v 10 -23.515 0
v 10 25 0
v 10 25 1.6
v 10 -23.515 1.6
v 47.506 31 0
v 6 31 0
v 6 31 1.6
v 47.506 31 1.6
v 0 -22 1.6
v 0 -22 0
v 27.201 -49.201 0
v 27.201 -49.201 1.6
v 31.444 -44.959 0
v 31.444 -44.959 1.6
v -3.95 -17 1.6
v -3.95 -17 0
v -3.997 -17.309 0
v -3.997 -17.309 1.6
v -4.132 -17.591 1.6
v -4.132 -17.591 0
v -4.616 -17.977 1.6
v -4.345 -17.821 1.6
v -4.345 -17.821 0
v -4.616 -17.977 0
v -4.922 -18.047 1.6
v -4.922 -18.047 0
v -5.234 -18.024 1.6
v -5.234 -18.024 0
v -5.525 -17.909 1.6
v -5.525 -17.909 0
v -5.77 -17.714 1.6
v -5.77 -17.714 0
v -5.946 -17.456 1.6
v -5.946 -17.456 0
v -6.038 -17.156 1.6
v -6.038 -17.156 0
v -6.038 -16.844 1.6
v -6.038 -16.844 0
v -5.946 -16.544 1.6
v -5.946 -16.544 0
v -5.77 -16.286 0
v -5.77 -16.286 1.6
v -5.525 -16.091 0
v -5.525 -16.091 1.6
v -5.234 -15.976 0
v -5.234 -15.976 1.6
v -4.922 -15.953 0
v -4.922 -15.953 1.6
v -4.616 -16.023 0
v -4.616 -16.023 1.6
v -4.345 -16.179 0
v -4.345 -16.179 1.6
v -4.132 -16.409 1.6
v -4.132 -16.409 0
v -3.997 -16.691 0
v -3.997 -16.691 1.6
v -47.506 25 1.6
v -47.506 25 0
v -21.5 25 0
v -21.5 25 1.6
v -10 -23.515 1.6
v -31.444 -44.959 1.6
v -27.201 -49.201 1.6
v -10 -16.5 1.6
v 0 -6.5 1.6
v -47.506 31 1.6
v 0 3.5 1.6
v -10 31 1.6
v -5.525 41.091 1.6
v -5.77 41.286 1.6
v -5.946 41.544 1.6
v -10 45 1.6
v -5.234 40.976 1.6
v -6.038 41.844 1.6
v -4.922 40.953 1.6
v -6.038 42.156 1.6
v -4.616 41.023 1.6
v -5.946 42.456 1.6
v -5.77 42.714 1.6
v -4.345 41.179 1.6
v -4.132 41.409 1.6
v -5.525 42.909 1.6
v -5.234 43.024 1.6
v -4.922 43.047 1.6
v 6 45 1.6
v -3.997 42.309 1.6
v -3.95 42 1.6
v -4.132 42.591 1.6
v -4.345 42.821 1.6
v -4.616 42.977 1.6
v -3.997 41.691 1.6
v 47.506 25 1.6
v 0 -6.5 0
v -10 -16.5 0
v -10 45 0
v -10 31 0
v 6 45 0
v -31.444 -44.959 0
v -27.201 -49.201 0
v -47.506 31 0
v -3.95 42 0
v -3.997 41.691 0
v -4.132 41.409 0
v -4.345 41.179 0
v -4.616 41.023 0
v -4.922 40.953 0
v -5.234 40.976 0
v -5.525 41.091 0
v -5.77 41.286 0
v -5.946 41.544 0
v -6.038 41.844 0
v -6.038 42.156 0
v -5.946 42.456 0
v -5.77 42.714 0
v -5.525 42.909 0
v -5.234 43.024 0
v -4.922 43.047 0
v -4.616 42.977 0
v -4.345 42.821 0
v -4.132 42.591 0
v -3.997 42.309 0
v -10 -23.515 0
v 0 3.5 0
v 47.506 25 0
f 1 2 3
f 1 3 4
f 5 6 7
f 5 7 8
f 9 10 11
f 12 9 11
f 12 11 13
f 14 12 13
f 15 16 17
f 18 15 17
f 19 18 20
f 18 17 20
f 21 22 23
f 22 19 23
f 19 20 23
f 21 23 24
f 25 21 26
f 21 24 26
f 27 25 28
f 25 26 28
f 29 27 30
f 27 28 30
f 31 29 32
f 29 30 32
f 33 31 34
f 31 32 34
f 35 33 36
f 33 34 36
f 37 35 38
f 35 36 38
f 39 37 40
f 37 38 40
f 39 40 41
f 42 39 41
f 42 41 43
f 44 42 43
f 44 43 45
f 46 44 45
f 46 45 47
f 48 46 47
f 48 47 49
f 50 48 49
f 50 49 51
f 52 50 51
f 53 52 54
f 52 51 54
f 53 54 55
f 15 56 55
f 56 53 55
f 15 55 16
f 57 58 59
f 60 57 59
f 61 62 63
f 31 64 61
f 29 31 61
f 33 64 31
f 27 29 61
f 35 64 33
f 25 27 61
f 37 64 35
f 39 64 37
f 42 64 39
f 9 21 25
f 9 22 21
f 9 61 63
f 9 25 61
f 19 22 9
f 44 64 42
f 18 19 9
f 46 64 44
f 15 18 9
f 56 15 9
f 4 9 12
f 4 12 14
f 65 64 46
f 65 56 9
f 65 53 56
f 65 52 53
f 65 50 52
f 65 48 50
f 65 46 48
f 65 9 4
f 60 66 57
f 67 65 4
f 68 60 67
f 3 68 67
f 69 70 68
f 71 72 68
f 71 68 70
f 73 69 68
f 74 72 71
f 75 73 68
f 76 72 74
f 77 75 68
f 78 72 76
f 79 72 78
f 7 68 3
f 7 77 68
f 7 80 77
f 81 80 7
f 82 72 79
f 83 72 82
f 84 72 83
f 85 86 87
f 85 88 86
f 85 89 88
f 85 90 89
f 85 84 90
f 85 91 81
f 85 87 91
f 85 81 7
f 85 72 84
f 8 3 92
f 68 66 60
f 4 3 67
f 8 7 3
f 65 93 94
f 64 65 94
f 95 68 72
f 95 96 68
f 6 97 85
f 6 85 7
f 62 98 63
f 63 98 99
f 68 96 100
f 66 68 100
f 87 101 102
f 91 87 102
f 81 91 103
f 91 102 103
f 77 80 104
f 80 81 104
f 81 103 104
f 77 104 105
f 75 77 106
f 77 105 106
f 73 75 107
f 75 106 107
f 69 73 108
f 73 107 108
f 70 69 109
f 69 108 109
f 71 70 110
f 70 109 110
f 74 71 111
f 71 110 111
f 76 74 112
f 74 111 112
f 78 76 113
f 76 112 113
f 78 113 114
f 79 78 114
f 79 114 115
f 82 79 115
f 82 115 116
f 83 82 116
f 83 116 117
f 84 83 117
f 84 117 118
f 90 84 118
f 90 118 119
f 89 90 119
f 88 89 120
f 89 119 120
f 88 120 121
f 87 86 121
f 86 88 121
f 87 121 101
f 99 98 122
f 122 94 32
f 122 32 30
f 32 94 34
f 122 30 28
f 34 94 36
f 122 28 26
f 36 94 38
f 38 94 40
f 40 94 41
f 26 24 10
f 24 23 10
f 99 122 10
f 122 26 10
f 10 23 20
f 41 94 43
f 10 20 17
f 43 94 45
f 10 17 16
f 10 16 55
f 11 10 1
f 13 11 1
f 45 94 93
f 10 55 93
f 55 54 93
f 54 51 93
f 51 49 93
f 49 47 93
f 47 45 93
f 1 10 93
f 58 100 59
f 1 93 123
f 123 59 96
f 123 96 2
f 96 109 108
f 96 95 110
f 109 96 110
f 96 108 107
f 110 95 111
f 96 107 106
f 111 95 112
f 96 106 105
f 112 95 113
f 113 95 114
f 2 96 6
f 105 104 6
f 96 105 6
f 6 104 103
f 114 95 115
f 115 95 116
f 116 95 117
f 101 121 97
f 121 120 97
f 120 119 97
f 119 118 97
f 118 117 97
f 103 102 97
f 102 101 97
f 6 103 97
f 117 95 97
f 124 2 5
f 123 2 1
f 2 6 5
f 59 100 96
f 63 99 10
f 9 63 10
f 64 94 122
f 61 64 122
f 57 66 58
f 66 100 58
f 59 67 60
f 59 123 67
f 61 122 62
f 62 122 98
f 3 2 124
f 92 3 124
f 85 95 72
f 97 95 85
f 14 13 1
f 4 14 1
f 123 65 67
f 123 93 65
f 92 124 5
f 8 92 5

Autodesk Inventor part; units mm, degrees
ref_plane "YZ Plane" through (0, 0, 0) normal (1, 0, 0) x (0, 1, 0)
ref_plane "XZ Plane" through (0, 0, 0) normal (0, 1, 0) x (-1, 0, 0)
ref_plane "XY Plane" through (0, 0, 0) normal (0, 0, 1) x (1, 0, 0)
sketch "Skizze1" plane through (0, 0, 0) normal (0, 0, 1) x (1, 0, 0)
  circle A0 centre (-57.772, 35) radius 20 construction
  circle A1 centre (57.772, 35) radius 20 construction
  circle A2 centre (35, -57.772) radius 20 construction
  circle A3 centre (-35, -57.772) radius 20 construction
  line L0 (0, 81.5544) -> (0, -104.3264) construction
  line L1 (-108.8808, 0) -> (108.8808, 0) construction
  circle A4 centre (0, 0) radius 25 construction
  line L2 (10, 25) -> (10, -23.5147)
  circle A5 centre (-6, -2.5) radius 6 construction
  line L3 (0, 3.5) -> (-21.5, 25)
  line L4 (0, -6.5) -> (-10, -16.5)
  line L5 (-10, -16.5) -> (-10, -23.5147)
  line L6 (-10, -23.5147) -> (-31.444, -44.9587)
  line L7 (-31.444, -44.9587) -> (-27.2013, -49.2013)
  line L8 (-27.2013, -49.2013) -> (0, -22)
  line L9 (0, -22) -> (27.2013, -49.2013)
  line L10 (27.2013, -49.2013) -> (31.444, -44.9587)
  line L11 (31.444, -44.9587) -> (10, -23.5147)
  line L12 (0, -6.5) -> (0, 3.5)
  line L13 (10, 25) -> (47.5055, 25)
  line L14 (47.5055, 25) -> (47.5055, 31)
  line L15 (-10, 31) -> (-47.5055, 31)
  line L16 (-47.5055, 31) -> (-47.5055, 25)
  line L17 (-47.5055, 25) -> (-21.5, 25)
  line L18 (-10, 31) -> (-10, 45)
  line L19 (-10, 45) -> (6, 45)
  line L20 (6, 45) -> (6, 31)
  line L21 (6, 31) -> (47.5055, 31)
  line L22 (-61.4468, -24.6516) -> (-51.4468, -24.6516) construction
  line L23 (-51.4468, -24.6516) -> (-56.4468, -27.5384) construction
  line L24 (-56.4468, -27.5384) -> (-61.4468, -24.6516) construction
  line L25 (-56.4468, -27.5384) -> (-56.4468, -24.6516) construction
  circle A6 centre (-27.2013, -44.9587) radius 3 construction
  circle A7 centre (-27.2013, -44.9587) radius 5 construction
  circle A8 centre (-44.5055, 28) radius 3 construction
  circle A9 centre (-44.5055, 28) radius 5 construction
  circle A10 centre (-5, -17) radius 1.05
  circle A11 centre (-5, 42) radius 1.05
  dimension "d0" = 35
  dimension "d1" = 57.772
  dimension "d2" = 40
  dimension "d3" = 57.772
  dimension "d4" = 35
  dimension "d5" = 40
  dimension "d6" = 50
  dimension "d7" = 10
  dimension "d9" = 6
  dimension "d10" = 2.5
  dimension "d11" = 12
  dimension "d12" = 6
  dimension "d13" = 6
  dimension "d14" = 4
  dimension "d15" = 10
  dimension "d16" = 6
  dimension "d20" = 31
  dimension "d21" = 10
  dimension "d22" = 120
  dimension "d23" = 2.8868
  dimension "d24" = 10
  dimension "d25" = 10
  dimension "d26" = 22
  dimension "d27" = 2.1
  dimension "d28" = 5
  dimension "d29" = 17
  dimension "d30" = 5
  dimension "d31" = 42
  dimension "d32" = 45
  dimension "d33" = 6
extrude "Extrusion1" add sketch "Skizze1" along normal blind 1.6
equation "\"d3\" = d1"
equation "\"d4\" = d0"
equation "\"d5\" = d2"
equation "\"d25\" = d24"
properties part number "Color Detect PCB" material "Phenolharz"
